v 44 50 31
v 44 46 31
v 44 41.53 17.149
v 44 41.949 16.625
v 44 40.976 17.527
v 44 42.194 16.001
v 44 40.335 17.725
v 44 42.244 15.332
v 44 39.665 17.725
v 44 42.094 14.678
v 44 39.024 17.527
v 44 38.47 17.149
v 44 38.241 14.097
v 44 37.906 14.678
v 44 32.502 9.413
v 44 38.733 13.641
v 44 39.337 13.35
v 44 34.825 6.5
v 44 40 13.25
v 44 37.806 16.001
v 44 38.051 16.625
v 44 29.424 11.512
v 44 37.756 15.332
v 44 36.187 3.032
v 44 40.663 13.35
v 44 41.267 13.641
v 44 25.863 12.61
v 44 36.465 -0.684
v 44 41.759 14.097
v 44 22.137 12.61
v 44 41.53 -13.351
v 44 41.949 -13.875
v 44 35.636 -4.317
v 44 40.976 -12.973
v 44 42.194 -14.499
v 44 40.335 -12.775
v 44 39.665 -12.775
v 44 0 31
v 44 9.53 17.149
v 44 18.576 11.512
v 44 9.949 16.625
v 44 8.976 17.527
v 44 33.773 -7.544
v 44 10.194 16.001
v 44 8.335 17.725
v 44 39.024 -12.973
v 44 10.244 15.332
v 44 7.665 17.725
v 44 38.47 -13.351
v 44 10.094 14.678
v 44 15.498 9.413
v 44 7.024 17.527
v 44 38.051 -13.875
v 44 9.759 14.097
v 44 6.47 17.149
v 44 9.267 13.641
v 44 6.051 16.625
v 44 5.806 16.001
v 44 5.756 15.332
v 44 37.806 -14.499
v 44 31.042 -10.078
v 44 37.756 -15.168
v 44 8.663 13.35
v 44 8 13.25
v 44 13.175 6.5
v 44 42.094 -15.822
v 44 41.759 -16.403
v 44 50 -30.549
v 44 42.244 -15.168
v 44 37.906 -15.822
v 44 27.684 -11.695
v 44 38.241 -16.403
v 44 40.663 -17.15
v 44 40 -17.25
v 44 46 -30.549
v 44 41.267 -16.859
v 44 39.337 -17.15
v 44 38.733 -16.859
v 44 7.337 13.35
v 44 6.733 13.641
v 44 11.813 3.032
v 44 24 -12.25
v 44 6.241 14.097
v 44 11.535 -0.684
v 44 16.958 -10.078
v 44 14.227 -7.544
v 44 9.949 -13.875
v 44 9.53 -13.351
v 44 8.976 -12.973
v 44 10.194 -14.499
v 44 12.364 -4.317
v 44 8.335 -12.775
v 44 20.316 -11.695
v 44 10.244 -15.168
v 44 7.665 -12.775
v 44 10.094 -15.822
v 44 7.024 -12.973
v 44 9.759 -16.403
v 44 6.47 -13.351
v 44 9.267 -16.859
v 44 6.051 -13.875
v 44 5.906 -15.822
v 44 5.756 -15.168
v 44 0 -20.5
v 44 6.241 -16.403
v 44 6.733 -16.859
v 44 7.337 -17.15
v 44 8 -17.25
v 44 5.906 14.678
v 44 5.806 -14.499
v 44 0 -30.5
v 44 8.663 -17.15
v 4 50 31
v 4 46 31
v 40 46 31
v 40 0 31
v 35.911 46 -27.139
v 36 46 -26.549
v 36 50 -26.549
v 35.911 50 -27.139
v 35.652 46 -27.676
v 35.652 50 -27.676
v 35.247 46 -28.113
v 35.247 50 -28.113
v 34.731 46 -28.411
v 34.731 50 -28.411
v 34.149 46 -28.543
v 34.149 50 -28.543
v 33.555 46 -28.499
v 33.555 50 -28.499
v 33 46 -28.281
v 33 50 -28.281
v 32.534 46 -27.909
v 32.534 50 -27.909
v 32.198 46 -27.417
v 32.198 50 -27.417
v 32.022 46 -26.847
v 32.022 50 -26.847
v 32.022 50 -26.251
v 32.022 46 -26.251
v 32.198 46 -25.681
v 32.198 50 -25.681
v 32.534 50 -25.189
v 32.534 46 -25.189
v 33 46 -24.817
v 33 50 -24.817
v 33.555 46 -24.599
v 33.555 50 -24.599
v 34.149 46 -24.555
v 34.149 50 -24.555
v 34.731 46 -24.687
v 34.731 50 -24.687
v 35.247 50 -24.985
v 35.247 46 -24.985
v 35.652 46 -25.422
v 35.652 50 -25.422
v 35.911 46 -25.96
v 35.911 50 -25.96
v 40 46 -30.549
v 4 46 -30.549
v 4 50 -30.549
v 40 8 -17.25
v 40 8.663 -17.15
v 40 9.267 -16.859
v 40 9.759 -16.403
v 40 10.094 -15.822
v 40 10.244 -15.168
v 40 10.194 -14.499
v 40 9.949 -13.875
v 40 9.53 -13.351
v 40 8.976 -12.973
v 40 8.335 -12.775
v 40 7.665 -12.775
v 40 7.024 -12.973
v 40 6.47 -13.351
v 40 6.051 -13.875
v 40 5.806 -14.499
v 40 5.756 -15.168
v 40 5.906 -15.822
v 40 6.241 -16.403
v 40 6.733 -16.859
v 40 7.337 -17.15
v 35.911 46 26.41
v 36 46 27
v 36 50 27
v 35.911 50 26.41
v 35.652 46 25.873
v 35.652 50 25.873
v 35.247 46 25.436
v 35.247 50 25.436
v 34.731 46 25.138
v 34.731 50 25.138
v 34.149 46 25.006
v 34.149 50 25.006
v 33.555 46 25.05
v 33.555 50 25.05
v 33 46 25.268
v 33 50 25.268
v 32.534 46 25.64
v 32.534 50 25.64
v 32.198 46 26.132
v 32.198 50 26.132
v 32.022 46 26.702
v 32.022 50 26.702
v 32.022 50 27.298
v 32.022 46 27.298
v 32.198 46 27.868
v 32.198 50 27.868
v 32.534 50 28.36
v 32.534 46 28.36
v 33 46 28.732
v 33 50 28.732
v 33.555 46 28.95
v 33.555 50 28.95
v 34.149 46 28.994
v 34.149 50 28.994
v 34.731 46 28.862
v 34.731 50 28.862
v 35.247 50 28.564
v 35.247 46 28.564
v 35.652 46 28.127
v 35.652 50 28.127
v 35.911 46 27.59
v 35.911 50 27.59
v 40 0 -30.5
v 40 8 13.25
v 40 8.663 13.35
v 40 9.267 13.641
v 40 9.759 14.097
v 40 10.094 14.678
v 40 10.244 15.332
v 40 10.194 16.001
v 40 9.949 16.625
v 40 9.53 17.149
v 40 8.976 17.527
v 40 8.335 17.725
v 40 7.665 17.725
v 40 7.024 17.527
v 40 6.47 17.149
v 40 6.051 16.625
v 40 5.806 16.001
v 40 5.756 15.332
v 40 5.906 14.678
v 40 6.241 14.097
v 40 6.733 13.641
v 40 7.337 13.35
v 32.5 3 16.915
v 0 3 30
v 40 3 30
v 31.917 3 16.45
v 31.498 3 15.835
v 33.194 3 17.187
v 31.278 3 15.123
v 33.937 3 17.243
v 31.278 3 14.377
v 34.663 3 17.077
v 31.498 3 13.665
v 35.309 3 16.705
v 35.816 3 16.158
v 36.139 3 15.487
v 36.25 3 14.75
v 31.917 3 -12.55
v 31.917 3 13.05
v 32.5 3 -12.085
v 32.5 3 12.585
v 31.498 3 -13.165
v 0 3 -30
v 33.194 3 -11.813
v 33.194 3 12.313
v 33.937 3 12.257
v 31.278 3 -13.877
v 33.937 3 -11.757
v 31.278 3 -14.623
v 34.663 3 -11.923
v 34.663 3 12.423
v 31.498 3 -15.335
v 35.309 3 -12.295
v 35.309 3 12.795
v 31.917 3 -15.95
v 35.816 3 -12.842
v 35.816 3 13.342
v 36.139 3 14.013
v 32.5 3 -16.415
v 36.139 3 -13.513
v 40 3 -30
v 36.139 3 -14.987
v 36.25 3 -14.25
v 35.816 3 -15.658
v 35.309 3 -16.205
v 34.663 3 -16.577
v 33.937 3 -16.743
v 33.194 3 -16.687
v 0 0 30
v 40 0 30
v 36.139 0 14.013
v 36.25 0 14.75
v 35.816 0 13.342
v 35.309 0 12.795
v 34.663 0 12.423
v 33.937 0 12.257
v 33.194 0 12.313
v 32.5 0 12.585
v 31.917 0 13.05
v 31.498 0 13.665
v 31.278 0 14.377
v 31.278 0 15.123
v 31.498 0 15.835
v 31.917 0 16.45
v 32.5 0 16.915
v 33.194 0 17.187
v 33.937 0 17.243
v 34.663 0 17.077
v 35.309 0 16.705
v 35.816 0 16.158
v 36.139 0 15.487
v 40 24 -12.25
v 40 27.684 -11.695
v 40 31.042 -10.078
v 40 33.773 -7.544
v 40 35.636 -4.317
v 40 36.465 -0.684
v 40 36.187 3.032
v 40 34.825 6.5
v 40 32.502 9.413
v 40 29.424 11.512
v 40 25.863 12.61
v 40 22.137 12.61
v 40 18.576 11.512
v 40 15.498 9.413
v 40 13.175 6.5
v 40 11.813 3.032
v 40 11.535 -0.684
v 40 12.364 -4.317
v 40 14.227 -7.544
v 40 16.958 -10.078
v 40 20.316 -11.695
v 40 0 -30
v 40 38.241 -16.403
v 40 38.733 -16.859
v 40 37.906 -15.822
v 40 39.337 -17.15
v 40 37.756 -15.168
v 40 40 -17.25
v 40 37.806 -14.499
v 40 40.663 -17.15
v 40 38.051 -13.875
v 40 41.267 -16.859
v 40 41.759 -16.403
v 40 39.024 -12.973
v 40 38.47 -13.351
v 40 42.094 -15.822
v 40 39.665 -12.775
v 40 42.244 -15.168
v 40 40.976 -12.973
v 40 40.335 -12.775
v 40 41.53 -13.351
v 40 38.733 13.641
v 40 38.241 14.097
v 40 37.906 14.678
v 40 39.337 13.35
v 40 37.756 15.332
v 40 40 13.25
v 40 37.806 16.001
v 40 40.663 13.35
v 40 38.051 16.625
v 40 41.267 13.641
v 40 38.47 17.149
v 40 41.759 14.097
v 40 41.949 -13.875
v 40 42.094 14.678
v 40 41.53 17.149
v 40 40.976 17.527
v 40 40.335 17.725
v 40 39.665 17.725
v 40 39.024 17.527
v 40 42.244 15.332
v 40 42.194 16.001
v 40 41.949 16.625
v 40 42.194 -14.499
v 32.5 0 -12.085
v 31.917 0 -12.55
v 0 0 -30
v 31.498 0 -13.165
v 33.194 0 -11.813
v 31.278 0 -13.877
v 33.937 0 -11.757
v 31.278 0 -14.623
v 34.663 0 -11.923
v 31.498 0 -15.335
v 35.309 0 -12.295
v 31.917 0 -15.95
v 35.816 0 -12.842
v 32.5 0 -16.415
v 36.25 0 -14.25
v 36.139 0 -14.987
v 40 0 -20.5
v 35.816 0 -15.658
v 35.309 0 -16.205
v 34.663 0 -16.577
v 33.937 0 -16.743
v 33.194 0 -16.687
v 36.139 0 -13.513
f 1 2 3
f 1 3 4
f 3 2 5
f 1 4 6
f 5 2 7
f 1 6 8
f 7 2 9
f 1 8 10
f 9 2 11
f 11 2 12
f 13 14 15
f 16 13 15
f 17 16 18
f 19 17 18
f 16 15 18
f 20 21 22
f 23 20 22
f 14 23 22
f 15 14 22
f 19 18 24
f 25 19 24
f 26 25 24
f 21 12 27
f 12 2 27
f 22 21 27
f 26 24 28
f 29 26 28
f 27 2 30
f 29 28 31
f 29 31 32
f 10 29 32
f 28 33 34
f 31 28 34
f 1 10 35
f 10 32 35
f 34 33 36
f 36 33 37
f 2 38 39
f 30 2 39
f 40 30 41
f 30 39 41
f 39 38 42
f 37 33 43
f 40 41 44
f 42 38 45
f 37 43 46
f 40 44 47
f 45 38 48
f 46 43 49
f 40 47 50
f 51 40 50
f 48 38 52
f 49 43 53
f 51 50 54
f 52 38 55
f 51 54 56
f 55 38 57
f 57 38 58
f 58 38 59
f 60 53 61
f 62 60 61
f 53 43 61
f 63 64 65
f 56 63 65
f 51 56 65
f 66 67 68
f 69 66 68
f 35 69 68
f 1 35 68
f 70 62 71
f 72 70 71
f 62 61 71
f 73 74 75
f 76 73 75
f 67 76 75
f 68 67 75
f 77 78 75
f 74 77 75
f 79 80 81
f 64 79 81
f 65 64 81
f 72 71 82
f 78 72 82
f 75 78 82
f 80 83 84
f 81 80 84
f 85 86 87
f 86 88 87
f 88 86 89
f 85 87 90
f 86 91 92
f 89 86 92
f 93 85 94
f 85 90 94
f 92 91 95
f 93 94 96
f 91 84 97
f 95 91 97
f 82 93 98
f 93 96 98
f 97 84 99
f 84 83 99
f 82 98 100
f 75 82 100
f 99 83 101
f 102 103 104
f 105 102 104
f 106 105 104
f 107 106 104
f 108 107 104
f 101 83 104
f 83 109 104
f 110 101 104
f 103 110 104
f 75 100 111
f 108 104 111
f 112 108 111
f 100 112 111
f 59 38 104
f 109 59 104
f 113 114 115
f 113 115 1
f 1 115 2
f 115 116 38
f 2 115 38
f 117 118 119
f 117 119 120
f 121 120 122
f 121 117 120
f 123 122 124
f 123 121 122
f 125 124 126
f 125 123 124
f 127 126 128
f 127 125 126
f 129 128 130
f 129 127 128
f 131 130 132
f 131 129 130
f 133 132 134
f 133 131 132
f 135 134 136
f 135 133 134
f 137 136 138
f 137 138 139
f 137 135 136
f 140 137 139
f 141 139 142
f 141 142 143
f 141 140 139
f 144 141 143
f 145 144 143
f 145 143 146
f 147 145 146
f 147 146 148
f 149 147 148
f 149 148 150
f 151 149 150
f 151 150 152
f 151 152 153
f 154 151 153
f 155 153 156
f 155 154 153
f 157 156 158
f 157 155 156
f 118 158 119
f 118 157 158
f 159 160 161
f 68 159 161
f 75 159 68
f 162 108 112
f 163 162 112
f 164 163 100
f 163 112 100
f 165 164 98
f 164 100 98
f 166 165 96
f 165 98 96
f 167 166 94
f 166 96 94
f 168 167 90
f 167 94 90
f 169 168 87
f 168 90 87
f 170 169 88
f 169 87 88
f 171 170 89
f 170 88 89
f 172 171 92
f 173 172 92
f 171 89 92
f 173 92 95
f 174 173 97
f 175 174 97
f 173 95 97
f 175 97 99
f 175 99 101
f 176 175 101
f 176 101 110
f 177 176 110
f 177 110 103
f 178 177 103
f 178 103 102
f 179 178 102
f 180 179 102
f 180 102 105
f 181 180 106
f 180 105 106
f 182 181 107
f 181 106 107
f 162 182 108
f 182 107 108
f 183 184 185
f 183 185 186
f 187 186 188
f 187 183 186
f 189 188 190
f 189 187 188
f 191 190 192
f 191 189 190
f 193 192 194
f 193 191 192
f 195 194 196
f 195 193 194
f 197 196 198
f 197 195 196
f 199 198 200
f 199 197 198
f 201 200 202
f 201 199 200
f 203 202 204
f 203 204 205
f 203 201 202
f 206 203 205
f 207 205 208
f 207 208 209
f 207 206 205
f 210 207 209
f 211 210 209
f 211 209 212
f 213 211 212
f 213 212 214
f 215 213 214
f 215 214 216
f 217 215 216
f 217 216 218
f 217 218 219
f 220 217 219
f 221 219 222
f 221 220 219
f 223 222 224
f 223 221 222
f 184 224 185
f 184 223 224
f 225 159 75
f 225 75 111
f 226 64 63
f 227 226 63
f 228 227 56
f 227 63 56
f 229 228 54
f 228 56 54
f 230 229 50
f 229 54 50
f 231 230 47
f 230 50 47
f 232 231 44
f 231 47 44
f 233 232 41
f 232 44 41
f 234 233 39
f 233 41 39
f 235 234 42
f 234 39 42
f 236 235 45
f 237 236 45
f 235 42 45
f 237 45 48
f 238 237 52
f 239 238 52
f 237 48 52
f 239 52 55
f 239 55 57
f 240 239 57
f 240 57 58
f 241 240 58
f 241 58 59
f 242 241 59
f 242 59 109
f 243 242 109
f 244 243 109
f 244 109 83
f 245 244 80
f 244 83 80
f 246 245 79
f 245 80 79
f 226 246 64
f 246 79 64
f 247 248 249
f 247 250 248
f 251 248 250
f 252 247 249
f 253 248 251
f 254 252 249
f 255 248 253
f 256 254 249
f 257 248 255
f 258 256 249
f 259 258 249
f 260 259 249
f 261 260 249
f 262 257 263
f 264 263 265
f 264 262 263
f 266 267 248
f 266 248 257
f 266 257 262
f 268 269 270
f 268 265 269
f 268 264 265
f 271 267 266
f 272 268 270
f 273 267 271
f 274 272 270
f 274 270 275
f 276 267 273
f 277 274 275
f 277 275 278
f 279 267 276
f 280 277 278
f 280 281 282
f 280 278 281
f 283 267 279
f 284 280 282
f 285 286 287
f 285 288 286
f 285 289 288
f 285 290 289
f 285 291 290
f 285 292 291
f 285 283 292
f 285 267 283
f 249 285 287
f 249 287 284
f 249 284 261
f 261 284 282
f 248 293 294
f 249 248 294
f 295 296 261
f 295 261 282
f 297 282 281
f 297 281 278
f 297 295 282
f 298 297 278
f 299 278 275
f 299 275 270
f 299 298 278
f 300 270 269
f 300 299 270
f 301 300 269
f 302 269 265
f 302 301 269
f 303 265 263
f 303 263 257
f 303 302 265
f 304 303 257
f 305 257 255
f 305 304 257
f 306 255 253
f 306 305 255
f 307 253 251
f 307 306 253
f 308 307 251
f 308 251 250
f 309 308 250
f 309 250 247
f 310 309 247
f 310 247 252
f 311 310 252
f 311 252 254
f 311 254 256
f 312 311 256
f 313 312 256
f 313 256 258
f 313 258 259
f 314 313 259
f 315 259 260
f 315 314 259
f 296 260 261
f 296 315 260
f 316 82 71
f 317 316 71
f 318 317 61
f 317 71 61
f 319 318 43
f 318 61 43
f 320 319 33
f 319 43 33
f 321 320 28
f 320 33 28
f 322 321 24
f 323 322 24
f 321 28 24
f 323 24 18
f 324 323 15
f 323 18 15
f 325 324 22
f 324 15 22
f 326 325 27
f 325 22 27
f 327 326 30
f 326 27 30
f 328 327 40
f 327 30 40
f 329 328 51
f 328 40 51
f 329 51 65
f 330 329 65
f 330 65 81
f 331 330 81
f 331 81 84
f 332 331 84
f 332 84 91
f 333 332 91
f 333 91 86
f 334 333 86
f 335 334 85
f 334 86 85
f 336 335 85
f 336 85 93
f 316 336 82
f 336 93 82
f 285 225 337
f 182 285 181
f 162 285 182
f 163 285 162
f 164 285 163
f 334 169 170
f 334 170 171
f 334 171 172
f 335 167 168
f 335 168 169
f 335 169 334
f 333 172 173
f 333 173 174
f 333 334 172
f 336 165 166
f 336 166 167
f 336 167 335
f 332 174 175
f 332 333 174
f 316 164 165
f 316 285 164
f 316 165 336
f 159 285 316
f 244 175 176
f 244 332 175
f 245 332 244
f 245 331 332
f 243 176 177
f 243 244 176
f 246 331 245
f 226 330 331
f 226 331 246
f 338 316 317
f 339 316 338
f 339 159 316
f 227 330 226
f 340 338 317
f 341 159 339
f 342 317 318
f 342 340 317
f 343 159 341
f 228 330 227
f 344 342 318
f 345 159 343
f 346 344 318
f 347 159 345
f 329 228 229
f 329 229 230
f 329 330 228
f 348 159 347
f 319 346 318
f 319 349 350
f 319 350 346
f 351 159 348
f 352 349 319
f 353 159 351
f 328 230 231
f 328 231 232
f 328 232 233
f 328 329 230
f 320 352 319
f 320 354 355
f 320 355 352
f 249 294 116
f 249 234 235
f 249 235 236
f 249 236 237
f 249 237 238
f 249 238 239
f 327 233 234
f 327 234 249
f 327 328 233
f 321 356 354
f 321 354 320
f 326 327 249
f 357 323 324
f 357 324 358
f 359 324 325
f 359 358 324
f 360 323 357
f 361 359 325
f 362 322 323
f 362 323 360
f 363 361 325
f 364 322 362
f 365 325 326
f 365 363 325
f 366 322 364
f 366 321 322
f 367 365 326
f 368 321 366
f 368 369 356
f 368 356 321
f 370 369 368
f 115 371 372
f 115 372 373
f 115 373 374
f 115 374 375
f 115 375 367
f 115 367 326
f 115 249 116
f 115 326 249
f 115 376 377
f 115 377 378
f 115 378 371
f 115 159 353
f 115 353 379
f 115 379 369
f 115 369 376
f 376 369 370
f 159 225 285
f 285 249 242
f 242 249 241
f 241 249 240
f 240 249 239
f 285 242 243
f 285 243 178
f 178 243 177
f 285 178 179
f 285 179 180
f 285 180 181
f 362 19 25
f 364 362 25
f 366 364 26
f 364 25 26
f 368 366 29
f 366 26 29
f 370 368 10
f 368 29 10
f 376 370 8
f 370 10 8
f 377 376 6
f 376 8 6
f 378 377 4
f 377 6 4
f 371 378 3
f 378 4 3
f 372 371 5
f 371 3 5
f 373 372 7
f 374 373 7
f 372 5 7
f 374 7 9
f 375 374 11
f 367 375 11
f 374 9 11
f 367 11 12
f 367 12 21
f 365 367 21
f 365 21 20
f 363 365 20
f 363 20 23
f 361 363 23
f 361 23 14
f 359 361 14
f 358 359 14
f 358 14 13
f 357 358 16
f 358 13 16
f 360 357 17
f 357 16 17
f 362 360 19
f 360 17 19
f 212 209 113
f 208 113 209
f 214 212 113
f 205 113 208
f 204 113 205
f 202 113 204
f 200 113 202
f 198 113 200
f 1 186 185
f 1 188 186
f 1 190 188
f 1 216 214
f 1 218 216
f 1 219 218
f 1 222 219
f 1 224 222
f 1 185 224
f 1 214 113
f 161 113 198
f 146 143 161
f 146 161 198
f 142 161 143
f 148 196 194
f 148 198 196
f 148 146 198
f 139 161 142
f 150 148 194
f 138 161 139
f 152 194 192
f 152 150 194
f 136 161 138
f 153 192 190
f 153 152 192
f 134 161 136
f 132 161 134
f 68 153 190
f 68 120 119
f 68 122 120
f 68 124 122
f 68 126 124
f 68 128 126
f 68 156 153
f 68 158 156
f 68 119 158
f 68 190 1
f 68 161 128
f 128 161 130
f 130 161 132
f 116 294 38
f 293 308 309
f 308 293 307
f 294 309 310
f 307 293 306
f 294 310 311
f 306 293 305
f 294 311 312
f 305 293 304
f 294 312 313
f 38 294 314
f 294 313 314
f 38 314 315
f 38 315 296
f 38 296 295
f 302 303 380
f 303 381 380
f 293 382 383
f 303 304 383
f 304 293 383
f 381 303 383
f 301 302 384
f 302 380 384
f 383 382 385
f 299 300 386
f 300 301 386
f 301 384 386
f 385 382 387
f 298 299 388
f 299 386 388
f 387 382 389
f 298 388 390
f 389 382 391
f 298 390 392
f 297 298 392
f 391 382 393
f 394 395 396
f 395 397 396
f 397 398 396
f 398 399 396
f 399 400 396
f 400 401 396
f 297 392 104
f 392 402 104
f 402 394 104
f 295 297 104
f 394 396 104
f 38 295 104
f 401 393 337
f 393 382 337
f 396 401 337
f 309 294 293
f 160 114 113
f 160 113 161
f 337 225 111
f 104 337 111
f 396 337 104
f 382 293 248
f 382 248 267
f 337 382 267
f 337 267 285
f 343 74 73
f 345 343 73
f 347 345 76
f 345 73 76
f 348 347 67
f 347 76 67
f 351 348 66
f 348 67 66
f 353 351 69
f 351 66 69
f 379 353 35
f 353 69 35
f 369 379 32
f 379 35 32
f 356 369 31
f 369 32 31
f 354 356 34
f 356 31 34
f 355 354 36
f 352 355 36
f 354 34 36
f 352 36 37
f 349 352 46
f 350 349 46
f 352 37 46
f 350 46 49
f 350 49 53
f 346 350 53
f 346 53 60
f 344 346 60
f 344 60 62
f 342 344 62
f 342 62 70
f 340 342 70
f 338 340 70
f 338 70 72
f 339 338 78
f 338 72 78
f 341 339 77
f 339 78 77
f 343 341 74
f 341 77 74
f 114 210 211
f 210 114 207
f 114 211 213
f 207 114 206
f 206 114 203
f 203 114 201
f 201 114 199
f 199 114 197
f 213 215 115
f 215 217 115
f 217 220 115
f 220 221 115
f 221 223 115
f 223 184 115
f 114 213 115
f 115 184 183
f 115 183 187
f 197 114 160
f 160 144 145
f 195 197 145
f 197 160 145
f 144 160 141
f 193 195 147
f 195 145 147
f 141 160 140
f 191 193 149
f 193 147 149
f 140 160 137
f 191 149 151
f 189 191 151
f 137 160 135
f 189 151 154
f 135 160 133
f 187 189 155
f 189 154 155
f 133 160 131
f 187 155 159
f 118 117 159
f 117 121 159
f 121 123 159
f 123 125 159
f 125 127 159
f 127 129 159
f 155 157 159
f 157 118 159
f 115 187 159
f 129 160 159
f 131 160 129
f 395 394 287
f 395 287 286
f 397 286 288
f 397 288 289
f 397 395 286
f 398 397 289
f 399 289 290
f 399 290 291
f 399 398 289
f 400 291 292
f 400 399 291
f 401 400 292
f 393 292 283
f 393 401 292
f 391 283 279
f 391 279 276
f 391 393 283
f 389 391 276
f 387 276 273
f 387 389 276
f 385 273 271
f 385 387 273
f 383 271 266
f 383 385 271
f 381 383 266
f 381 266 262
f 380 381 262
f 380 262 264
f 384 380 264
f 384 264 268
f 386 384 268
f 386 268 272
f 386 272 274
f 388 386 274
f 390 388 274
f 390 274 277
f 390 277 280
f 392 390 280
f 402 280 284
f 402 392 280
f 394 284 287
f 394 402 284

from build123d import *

# Parameters (mm, degrees)
CROQUIS1_W              = 40
CROQUIS1_H              = 41.5
CROQUIS1_R              = 2.5
SALIENTE_EXTRUIR1_DEPTH = 3
CROQUIS2_W              = 4
CROQUIS2_H              = 41.5
SALIENTE_EXTRUIR2_DEPTH = 45
CORTAR_EXTRUIR1_START   = 44
CROQUIS3_R              = 12.5
CROQUIS3_R_2            = 2.25
CORTAR_EXTRUIR1_DEPTH   = 4
SALIENTE_EXTRUIR4_START = 40
SALIENTE_EXTRUIR4_DEPTH = 4
CROQUIS6_W              = 40
CROQUIS6_H              = 9.5
CROQUIS6_H_2            = 9
SALIENTE_EXTRUIR5_DEPTH = 3
SALIENTE_EXTRUIR6_START = 46
CROQUIS7_W              = 40
CROQUIS7_H              = 61.549056497
CROQUIS7_R              = 2
SALIENTE_EXTRUIR6_DEPTH = 4


with BuildPart() as part:
    # Croquis1 → Saliente-Extruir1 (new body)
    with BuildSketch(Plane(origin=(0, 0, 0), x_dir=(1, 0, 0), z_dir=(0, 1, 0))):
        with Locations((20, -0.25)):
            Rectangle(CROQUIS1_W, CROQUIS1_H)
        with Locations((33.75, 14.25)):
            Circle(CROQUIS1_R, mode=Mode.SUBTRACT)
        with Locations((33.75, -14.75)):
            Circle(CROQUIS1_R, mode=Mode.SUBTRACT)
    extrude(amount=SALIENTE_EXTRUIR1_DEPTH)

    # Croquis2 → Saliente-Extruir2 (add)
    with BuildSketch(Plane(origin=(0, 0, 0), x_dir=(1, 0, 0), z_dir=(0, 1, 0))):
        with Locations((42, -0.25)):
            Rectangle(CROQUIS2_W, CROQUIS2_H)
    extrude(amount=SALIENTE_EXTRUIR2_DEPTH)

    # Croquis3 → Cortar-Extruir1 (cut)
    with BuildSketch(Plane(origin=(0, 0, 0), x_dir=(0, 0, -1), z_dir=(1, 0, 0)).offset(CORTAR_EXTRUIR1_START)):
        with Locations((-0.25, 24)):
            Circle(CROQUIS3_R)
        with Locations((15, 40)):
            Circle(CROQUIS3_R_2)
        with Locations((-15.5, 40)):
            Circle(CROQUIS3_R_2)
        with Locations((-15.5, 8)):
            Circle(CROQUIS3_R_2)
        with Locations((15, 8)):
            Circle(CROQUIS3_R_2)
    extrude(amount=-CORTAR_EXTRUIR1_DEPTH, mode=Mode.SUBTRACT)

    # Croquis5 → Saliente-Extruir4 (add)
    with BuildSketch(Plane(origin=(0, 0, 0), x_dir=(0, 0, -1), z_dir=(1, 0, 0)).offset(SALIENTE_EXTRUIR4_START)):
        Polygon((-21, 0), (-31, 0), (-31, 46), (30.549056497, 46), (30.5, 2.6158e-05), (20.5, 2.6158e-05), (20.5, 45), (-21, 45), align=None)
    extrude(amount=SALIENTE_EXTRUIR4_DEPTH)

    # Croquis6 → Saliente-Extruir5 (add)
    with BuildSketch(Plane(origin=(0, 0, 0), x_dir=(1, 0, 0), z_dir=(0, 1, 0))):
        with Locations((20, 25.25)):
            Rectangle(CROQUIS6_W, CROQUIS6_H)
        with Locations((20, -25.5)):
            Rectangle(CROQUIS6_W, CROQUIS6_H_2)
    extrude(amount=SALIENTE_EXTRUIR5_DEPTH)

    # Croquis7 → Saliente-Extruir6 (add)
    with BuildSketch(Plane(origin=(0, 0, 0), x_dir=(1, 0, 0), z_dir=(0, 1, 0)).offset(SALIENTE_EXTRUIR6_START)):
        with Locations((24, -0.225471752)):
            Rectangle(CROQUIS7_W, CROQUIS7_H)
        with Locations((34, 26.549056497)):
            Circle(CROQUIS7_R, mode=Mode.SUBTRACT)
        with Locations((34, -27)):
            Circle(CROQUIS7_R, mode=Mode.SUBTRACT)
    extrude(amount=SALIENTE_EXTRUIR6_DEPTH)


solid = part.part
